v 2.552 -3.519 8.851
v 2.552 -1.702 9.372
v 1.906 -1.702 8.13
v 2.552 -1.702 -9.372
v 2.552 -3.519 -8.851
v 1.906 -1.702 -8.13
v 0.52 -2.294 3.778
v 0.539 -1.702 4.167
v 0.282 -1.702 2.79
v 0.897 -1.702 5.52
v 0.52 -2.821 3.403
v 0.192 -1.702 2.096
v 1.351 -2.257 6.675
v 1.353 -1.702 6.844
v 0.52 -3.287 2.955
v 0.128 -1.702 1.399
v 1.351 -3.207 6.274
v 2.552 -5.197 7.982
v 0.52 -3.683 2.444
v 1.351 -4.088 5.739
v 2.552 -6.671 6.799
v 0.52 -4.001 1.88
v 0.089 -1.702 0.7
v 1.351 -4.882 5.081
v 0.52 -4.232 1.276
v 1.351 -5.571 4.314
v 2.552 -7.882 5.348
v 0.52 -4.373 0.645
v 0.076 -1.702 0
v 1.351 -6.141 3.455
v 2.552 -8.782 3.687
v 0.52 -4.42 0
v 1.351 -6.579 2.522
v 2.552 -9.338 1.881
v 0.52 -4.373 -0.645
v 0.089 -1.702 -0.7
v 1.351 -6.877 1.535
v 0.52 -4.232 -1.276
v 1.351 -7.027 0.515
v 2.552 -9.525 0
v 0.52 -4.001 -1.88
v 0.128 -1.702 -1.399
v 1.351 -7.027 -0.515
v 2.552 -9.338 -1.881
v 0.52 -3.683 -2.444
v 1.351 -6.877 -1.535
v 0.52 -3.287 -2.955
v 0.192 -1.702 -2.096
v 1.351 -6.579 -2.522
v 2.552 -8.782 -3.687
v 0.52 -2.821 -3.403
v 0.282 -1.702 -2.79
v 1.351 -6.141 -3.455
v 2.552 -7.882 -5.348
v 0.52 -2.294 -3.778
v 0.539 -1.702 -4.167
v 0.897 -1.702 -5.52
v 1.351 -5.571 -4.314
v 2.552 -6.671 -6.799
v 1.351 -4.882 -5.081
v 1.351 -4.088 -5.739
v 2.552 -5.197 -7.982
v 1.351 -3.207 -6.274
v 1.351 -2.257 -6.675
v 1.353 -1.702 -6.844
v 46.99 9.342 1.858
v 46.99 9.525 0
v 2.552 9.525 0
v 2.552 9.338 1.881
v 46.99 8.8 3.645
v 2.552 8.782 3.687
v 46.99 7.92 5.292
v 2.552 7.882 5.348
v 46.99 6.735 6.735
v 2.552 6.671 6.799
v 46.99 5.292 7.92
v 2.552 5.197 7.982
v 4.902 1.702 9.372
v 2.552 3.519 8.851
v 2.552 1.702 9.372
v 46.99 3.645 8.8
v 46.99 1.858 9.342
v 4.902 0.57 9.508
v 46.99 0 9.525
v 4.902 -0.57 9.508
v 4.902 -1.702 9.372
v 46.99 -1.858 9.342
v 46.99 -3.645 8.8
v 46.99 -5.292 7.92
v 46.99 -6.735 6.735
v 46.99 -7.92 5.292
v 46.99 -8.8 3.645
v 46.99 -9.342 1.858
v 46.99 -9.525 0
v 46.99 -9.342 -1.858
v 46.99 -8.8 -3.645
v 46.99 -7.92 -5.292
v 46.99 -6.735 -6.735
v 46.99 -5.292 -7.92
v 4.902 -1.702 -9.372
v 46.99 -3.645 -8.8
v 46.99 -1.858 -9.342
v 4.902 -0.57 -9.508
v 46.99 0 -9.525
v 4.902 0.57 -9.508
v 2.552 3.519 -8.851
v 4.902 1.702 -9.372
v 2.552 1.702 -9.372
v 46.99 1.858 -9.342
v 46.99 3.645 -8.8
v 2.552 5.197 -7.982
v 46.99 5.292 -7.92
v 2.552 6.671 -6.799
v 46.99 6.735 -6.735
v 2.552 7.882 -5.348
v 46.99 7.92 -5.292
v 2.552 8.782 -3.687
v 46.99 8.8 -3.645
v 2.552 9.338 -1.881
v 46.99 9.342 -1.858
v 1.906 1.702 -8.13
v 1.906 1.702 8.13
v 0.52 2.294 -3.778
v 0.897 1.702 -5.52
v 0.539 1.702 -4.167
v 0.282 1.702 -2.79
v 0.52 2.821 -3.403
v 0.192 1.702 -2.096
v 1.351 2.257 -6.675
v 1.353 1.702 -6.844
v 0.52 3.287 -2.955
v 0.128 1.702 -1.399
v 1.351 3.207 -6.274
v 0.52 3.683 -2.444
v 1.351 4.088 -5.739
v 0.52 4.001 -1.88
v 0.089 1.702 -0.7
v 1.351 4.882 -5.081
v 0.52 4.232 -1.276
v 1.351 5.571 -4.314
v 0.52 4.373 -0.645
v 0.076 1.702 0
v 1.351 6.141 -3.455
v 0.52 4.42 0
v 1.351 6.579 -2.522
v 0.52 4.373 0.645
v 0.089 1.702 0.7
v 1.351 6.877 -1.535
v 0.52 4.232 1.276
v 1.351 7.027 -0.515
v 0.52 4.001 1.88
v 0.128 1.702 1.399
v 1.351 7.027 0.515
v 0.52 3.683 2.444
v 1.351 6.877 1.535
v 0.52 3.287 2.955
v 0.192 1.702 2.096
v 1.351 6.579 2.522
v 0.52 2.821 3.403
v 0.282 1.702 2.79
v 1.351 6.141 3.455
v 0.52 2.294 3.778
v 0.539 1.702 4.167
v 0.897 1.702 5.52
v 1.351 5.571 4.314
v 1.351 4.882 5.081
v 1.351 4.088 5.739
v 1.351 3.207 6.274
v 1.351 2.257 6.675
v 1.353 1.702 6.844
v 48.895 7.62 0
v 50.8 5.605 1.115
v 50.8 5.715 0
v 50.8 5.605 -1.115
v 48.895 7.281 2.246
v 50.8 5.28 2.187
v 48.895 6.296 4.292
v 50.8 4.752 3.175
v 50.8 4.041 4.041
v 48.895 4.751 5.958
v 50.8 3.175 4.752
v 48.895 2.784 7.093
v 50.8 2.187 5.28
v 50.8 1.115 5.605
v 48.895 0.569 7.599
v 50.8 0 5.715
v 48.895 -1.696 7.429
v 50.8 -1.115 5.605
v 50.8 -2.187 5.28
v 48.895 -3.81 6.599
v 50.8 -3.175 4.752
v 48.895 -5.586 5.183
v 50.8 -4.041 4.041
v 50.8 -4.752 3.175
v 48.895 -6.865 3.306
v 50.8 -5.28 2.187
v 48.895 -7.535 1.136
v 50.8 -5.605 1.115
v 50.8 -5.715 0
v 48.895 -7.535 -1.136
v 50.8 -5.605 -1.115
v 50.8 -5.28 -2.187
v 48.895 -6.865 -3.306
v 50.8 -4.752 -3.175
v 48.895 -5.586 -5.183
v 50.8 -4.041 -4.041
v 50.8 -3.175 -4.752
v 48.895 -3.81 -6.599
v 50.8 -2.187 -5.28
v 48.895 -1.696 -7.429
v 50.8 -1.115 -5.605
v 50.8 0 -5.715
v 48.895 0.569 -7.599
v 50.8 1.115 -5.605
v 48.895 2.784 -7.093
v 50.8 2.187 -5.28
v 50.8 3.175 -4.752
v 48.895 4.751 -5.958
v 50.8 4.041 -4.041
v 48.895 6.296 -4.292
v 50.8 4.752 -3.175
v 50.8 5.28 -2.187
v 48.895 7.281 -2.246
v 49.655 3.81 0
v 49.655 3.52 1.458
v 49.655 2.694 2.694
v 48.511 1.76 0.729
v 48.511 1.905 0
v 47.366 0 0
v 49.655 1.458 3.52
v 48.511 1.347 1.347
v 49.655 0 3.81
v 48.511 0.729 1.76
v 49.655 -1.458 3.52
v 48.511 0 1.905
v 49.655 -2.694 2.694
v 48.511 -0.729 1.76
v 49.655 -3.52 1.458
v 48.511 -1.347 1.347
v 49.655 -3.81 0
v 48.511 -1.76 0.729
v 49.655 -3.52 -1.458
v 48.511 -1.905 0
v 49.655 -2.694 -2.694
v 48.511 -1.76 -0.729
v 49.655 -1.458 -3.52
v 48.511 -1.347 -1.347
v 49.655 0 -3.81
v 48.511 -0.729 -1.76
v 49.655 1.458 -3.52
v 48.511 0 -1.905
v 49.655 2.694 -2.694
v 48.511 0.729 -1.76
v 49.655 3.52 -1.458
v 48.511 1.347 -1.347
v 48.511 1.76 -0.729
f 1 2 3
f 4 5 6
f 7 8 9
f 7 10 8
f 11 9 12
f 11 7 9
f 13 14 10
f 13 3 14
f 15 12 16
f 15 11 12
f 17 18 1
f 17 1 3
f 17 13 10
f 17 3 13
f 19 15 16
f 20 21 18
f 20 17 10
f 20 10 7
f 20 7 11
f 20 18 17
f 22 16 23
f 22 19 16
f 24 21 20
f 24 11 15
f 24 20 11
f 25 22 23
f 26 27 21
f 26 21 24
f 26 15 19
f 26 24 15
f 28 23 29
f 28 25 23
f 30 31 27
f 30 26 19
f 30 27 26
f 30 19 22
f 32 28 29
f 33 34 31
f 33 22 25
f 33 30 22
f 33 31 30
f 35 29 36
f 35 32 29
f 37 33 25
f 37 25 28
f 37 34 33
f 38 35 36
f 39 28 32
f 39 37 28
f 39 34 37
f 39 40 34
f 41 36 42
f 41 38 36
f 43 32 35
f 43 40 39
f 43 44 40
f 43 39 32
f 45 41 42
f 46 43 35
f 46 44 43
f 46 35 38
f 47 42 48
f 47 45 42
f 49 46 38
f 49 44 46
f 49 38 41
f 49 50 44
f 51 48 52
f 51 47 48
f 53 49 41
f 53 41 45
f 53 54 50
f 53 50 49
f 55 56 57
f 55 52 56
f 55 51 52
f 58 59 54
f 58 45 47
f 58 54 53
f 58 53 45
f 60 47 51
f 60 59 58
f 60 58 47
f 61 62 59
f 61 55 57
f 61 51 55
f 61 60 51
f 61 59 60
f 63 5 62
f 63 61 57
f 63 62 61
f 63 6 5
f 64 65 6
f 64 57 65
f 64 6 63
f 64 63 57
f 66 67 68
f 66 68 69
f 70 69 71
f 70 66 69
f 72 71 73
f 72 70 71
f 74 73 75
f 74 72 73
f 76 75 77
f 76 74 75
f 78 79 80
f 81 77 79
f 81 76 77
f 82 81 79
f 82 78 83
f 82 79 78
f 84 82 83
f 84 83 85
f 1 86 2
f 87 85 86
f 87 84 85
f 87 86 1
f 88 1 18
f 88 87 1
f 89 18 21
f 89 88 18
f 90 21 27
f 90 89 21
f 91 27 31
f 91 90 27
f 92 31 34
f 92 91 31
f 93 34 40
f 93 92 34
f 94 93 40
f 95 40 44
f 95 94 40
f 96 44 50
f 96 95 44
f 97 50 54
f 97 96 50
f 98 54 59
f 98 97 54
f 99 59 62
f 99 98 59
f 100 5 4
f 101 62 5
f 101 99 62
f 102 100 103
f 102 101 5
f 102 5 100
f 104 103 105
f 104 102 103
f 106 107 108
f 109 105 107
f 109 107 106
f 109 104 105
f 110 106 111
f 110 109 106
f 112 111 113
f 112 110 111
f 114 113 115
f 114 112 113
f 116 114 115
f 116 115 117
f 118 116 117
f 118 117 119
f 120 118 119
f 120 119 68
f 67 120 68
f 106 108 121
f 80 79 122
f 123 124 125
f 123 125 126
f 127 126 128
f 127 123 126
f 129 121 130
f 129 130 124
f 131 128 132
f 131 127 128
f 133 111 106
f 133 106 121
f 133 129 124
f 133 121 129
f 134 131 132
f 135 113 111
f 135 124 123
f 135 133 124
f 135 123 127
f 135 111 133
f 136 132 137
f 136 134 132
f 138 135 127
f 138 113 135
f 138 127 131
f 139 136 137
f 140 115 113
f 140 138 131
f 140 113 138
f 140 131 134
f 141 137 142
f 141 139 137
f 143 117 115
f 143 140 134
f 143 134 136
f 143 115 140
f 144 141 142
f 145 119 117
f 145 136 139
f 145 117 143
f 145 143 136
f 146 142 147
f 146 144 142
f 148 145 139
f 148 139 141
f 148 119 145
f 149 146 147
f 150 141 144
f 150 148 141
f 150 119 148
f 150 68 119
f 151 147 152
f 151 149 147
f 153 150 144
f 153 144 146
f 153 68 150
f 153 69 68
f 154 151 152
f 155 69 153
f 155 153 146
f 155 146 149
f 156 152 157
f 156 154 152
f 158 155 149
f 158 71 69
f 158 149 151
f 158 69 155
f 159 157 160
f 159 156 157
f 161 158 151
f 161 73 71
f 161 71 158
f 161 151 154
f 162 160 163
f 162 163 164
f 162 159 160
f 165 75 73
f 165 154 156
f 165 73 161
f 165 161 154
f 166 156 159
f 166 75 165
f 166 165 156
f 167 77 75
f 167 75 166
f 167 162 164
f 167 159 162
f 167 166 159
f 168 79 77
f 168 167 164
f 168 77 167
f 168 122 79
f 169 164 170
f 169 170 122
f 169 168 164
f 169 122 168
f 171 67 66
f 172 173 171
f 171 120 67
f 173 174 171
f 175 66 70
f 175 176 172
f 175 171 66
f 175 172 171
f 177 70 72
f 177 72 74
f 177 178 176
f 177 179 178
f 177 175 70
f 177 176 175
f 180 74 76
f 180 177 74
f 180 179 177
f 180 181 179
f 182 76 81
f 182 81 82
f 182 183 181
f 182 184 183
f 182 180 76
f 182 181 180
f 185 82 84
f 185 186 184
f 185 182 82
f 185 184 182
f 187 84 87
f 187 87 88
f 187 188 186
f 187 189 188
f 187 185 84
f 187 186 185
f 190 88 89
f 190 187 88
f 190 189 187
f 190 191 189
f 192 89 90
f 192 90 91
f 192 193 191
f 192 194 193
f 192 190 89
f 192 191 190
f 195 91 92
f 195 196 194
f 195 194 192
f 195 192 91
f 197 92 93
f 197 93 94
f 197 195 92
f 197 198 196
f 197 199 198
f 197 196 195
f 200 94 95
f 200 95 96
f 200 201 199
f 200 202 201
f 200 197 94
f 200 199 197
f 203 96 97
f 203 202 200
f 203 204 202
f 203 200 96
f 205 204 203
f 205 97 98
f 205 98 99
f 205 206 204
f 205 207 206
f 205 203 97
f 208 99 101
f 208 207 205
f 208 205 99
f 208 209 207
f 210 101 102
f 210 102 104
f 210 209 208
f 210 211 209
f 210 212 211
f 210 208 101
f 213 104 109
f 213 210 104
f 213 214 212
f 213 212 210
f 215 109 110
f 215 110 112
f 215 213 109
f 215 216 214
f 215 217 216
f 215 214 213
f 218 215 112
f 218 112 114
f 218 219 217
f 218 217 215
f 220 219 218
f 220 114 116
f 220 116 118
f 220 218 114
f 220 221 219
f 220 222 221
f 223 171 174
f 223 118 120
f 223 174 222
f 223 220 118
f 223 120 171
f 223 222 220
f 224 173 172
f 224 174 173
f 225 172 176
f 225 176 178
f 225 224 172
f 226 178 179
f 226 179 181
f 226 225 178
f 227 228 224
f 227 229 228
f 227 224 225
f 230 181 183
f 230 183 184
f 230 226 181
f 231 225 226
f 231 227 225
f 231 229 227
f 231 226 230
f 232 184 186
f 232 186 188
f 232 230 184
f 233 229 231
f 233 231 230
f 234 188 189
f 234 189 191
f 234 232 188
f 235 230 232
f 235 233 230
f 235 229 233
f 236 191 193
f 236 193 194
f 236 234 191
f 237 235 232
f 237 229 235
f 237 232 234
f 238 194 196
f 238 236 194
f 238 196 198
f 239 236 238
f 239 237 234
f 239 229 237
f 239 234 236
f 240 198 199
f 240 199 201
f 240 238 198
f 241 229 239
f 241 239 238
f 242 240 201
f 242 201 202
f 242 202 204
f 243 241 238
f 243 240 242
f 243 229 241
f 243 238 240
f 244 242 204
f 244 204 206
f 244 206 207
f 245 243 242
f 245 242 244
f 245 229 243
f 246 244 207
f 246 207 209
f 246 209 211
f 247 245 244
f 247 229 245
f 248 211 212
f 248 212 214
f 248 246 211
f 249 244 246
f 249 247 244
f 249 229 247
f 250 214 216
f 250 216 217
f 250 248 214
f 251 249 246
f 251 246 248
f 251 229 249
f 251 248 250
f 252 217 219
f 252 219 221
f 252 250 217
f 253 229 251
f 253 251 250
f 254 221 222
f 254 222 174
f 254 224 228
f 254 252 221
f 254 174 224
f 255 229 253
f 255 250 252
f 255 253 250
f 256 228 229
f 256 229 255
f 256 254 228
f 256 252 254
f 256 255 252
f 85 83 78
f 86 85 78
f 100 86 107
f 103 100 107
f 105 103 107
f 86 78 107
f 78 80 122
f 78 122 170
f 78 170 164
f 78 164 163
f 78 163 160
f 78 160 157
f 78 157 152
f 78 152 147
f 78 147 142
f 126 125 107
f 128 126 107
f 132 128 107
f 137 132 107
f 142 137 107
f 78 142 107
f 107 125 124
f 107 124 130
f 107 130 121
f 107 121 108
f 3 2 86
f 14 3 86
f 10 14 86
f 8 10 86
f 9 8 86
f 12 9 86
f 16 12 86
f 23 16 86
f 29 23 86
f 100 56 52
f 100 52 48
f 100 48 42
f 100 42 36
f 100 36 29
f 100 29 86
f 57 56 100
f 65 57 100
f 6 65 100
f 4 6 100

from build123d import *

# Parameters (mm, degrees)
SKETCH2_W  = 19.05
SKETCH2_H  = 3.4036
SLOT_DEPTH = 4.9022


with BuildPart() as part:
    # BodySke → BaseBody (revolve)
    with BuildSketch(Plane.XY):
        with BuildLine():
            Line((2.552216058, 9.525), (46.99, 9.525))
            Line((46.99, 9.525), (50.8, 5.715))
            Line((50.8, 5.715), (47.366081562, 0))
            Line((47.366081562, 0), (0, 0))
            ThreePointArc((0, 0), (0.649113009, 4.930502809), (2.552216058, 9.525))
        make_face()
    revolve(axis=Axis((-12.7, 0, 0), (1, 0, 0)))

    # Sketch2 → Slot (cut)
    with BuildSketch(Plane(origin=(0, 0, 0), x_dir=(0, 0, -1), z_dir=(1, 0, 0))):
        Rectangle(SKETCH2_W, SKETCH2_H)
    extrude(amount=SLOT_DEPTH, mode=Mode.SUBTRACT)


solid = part.part
